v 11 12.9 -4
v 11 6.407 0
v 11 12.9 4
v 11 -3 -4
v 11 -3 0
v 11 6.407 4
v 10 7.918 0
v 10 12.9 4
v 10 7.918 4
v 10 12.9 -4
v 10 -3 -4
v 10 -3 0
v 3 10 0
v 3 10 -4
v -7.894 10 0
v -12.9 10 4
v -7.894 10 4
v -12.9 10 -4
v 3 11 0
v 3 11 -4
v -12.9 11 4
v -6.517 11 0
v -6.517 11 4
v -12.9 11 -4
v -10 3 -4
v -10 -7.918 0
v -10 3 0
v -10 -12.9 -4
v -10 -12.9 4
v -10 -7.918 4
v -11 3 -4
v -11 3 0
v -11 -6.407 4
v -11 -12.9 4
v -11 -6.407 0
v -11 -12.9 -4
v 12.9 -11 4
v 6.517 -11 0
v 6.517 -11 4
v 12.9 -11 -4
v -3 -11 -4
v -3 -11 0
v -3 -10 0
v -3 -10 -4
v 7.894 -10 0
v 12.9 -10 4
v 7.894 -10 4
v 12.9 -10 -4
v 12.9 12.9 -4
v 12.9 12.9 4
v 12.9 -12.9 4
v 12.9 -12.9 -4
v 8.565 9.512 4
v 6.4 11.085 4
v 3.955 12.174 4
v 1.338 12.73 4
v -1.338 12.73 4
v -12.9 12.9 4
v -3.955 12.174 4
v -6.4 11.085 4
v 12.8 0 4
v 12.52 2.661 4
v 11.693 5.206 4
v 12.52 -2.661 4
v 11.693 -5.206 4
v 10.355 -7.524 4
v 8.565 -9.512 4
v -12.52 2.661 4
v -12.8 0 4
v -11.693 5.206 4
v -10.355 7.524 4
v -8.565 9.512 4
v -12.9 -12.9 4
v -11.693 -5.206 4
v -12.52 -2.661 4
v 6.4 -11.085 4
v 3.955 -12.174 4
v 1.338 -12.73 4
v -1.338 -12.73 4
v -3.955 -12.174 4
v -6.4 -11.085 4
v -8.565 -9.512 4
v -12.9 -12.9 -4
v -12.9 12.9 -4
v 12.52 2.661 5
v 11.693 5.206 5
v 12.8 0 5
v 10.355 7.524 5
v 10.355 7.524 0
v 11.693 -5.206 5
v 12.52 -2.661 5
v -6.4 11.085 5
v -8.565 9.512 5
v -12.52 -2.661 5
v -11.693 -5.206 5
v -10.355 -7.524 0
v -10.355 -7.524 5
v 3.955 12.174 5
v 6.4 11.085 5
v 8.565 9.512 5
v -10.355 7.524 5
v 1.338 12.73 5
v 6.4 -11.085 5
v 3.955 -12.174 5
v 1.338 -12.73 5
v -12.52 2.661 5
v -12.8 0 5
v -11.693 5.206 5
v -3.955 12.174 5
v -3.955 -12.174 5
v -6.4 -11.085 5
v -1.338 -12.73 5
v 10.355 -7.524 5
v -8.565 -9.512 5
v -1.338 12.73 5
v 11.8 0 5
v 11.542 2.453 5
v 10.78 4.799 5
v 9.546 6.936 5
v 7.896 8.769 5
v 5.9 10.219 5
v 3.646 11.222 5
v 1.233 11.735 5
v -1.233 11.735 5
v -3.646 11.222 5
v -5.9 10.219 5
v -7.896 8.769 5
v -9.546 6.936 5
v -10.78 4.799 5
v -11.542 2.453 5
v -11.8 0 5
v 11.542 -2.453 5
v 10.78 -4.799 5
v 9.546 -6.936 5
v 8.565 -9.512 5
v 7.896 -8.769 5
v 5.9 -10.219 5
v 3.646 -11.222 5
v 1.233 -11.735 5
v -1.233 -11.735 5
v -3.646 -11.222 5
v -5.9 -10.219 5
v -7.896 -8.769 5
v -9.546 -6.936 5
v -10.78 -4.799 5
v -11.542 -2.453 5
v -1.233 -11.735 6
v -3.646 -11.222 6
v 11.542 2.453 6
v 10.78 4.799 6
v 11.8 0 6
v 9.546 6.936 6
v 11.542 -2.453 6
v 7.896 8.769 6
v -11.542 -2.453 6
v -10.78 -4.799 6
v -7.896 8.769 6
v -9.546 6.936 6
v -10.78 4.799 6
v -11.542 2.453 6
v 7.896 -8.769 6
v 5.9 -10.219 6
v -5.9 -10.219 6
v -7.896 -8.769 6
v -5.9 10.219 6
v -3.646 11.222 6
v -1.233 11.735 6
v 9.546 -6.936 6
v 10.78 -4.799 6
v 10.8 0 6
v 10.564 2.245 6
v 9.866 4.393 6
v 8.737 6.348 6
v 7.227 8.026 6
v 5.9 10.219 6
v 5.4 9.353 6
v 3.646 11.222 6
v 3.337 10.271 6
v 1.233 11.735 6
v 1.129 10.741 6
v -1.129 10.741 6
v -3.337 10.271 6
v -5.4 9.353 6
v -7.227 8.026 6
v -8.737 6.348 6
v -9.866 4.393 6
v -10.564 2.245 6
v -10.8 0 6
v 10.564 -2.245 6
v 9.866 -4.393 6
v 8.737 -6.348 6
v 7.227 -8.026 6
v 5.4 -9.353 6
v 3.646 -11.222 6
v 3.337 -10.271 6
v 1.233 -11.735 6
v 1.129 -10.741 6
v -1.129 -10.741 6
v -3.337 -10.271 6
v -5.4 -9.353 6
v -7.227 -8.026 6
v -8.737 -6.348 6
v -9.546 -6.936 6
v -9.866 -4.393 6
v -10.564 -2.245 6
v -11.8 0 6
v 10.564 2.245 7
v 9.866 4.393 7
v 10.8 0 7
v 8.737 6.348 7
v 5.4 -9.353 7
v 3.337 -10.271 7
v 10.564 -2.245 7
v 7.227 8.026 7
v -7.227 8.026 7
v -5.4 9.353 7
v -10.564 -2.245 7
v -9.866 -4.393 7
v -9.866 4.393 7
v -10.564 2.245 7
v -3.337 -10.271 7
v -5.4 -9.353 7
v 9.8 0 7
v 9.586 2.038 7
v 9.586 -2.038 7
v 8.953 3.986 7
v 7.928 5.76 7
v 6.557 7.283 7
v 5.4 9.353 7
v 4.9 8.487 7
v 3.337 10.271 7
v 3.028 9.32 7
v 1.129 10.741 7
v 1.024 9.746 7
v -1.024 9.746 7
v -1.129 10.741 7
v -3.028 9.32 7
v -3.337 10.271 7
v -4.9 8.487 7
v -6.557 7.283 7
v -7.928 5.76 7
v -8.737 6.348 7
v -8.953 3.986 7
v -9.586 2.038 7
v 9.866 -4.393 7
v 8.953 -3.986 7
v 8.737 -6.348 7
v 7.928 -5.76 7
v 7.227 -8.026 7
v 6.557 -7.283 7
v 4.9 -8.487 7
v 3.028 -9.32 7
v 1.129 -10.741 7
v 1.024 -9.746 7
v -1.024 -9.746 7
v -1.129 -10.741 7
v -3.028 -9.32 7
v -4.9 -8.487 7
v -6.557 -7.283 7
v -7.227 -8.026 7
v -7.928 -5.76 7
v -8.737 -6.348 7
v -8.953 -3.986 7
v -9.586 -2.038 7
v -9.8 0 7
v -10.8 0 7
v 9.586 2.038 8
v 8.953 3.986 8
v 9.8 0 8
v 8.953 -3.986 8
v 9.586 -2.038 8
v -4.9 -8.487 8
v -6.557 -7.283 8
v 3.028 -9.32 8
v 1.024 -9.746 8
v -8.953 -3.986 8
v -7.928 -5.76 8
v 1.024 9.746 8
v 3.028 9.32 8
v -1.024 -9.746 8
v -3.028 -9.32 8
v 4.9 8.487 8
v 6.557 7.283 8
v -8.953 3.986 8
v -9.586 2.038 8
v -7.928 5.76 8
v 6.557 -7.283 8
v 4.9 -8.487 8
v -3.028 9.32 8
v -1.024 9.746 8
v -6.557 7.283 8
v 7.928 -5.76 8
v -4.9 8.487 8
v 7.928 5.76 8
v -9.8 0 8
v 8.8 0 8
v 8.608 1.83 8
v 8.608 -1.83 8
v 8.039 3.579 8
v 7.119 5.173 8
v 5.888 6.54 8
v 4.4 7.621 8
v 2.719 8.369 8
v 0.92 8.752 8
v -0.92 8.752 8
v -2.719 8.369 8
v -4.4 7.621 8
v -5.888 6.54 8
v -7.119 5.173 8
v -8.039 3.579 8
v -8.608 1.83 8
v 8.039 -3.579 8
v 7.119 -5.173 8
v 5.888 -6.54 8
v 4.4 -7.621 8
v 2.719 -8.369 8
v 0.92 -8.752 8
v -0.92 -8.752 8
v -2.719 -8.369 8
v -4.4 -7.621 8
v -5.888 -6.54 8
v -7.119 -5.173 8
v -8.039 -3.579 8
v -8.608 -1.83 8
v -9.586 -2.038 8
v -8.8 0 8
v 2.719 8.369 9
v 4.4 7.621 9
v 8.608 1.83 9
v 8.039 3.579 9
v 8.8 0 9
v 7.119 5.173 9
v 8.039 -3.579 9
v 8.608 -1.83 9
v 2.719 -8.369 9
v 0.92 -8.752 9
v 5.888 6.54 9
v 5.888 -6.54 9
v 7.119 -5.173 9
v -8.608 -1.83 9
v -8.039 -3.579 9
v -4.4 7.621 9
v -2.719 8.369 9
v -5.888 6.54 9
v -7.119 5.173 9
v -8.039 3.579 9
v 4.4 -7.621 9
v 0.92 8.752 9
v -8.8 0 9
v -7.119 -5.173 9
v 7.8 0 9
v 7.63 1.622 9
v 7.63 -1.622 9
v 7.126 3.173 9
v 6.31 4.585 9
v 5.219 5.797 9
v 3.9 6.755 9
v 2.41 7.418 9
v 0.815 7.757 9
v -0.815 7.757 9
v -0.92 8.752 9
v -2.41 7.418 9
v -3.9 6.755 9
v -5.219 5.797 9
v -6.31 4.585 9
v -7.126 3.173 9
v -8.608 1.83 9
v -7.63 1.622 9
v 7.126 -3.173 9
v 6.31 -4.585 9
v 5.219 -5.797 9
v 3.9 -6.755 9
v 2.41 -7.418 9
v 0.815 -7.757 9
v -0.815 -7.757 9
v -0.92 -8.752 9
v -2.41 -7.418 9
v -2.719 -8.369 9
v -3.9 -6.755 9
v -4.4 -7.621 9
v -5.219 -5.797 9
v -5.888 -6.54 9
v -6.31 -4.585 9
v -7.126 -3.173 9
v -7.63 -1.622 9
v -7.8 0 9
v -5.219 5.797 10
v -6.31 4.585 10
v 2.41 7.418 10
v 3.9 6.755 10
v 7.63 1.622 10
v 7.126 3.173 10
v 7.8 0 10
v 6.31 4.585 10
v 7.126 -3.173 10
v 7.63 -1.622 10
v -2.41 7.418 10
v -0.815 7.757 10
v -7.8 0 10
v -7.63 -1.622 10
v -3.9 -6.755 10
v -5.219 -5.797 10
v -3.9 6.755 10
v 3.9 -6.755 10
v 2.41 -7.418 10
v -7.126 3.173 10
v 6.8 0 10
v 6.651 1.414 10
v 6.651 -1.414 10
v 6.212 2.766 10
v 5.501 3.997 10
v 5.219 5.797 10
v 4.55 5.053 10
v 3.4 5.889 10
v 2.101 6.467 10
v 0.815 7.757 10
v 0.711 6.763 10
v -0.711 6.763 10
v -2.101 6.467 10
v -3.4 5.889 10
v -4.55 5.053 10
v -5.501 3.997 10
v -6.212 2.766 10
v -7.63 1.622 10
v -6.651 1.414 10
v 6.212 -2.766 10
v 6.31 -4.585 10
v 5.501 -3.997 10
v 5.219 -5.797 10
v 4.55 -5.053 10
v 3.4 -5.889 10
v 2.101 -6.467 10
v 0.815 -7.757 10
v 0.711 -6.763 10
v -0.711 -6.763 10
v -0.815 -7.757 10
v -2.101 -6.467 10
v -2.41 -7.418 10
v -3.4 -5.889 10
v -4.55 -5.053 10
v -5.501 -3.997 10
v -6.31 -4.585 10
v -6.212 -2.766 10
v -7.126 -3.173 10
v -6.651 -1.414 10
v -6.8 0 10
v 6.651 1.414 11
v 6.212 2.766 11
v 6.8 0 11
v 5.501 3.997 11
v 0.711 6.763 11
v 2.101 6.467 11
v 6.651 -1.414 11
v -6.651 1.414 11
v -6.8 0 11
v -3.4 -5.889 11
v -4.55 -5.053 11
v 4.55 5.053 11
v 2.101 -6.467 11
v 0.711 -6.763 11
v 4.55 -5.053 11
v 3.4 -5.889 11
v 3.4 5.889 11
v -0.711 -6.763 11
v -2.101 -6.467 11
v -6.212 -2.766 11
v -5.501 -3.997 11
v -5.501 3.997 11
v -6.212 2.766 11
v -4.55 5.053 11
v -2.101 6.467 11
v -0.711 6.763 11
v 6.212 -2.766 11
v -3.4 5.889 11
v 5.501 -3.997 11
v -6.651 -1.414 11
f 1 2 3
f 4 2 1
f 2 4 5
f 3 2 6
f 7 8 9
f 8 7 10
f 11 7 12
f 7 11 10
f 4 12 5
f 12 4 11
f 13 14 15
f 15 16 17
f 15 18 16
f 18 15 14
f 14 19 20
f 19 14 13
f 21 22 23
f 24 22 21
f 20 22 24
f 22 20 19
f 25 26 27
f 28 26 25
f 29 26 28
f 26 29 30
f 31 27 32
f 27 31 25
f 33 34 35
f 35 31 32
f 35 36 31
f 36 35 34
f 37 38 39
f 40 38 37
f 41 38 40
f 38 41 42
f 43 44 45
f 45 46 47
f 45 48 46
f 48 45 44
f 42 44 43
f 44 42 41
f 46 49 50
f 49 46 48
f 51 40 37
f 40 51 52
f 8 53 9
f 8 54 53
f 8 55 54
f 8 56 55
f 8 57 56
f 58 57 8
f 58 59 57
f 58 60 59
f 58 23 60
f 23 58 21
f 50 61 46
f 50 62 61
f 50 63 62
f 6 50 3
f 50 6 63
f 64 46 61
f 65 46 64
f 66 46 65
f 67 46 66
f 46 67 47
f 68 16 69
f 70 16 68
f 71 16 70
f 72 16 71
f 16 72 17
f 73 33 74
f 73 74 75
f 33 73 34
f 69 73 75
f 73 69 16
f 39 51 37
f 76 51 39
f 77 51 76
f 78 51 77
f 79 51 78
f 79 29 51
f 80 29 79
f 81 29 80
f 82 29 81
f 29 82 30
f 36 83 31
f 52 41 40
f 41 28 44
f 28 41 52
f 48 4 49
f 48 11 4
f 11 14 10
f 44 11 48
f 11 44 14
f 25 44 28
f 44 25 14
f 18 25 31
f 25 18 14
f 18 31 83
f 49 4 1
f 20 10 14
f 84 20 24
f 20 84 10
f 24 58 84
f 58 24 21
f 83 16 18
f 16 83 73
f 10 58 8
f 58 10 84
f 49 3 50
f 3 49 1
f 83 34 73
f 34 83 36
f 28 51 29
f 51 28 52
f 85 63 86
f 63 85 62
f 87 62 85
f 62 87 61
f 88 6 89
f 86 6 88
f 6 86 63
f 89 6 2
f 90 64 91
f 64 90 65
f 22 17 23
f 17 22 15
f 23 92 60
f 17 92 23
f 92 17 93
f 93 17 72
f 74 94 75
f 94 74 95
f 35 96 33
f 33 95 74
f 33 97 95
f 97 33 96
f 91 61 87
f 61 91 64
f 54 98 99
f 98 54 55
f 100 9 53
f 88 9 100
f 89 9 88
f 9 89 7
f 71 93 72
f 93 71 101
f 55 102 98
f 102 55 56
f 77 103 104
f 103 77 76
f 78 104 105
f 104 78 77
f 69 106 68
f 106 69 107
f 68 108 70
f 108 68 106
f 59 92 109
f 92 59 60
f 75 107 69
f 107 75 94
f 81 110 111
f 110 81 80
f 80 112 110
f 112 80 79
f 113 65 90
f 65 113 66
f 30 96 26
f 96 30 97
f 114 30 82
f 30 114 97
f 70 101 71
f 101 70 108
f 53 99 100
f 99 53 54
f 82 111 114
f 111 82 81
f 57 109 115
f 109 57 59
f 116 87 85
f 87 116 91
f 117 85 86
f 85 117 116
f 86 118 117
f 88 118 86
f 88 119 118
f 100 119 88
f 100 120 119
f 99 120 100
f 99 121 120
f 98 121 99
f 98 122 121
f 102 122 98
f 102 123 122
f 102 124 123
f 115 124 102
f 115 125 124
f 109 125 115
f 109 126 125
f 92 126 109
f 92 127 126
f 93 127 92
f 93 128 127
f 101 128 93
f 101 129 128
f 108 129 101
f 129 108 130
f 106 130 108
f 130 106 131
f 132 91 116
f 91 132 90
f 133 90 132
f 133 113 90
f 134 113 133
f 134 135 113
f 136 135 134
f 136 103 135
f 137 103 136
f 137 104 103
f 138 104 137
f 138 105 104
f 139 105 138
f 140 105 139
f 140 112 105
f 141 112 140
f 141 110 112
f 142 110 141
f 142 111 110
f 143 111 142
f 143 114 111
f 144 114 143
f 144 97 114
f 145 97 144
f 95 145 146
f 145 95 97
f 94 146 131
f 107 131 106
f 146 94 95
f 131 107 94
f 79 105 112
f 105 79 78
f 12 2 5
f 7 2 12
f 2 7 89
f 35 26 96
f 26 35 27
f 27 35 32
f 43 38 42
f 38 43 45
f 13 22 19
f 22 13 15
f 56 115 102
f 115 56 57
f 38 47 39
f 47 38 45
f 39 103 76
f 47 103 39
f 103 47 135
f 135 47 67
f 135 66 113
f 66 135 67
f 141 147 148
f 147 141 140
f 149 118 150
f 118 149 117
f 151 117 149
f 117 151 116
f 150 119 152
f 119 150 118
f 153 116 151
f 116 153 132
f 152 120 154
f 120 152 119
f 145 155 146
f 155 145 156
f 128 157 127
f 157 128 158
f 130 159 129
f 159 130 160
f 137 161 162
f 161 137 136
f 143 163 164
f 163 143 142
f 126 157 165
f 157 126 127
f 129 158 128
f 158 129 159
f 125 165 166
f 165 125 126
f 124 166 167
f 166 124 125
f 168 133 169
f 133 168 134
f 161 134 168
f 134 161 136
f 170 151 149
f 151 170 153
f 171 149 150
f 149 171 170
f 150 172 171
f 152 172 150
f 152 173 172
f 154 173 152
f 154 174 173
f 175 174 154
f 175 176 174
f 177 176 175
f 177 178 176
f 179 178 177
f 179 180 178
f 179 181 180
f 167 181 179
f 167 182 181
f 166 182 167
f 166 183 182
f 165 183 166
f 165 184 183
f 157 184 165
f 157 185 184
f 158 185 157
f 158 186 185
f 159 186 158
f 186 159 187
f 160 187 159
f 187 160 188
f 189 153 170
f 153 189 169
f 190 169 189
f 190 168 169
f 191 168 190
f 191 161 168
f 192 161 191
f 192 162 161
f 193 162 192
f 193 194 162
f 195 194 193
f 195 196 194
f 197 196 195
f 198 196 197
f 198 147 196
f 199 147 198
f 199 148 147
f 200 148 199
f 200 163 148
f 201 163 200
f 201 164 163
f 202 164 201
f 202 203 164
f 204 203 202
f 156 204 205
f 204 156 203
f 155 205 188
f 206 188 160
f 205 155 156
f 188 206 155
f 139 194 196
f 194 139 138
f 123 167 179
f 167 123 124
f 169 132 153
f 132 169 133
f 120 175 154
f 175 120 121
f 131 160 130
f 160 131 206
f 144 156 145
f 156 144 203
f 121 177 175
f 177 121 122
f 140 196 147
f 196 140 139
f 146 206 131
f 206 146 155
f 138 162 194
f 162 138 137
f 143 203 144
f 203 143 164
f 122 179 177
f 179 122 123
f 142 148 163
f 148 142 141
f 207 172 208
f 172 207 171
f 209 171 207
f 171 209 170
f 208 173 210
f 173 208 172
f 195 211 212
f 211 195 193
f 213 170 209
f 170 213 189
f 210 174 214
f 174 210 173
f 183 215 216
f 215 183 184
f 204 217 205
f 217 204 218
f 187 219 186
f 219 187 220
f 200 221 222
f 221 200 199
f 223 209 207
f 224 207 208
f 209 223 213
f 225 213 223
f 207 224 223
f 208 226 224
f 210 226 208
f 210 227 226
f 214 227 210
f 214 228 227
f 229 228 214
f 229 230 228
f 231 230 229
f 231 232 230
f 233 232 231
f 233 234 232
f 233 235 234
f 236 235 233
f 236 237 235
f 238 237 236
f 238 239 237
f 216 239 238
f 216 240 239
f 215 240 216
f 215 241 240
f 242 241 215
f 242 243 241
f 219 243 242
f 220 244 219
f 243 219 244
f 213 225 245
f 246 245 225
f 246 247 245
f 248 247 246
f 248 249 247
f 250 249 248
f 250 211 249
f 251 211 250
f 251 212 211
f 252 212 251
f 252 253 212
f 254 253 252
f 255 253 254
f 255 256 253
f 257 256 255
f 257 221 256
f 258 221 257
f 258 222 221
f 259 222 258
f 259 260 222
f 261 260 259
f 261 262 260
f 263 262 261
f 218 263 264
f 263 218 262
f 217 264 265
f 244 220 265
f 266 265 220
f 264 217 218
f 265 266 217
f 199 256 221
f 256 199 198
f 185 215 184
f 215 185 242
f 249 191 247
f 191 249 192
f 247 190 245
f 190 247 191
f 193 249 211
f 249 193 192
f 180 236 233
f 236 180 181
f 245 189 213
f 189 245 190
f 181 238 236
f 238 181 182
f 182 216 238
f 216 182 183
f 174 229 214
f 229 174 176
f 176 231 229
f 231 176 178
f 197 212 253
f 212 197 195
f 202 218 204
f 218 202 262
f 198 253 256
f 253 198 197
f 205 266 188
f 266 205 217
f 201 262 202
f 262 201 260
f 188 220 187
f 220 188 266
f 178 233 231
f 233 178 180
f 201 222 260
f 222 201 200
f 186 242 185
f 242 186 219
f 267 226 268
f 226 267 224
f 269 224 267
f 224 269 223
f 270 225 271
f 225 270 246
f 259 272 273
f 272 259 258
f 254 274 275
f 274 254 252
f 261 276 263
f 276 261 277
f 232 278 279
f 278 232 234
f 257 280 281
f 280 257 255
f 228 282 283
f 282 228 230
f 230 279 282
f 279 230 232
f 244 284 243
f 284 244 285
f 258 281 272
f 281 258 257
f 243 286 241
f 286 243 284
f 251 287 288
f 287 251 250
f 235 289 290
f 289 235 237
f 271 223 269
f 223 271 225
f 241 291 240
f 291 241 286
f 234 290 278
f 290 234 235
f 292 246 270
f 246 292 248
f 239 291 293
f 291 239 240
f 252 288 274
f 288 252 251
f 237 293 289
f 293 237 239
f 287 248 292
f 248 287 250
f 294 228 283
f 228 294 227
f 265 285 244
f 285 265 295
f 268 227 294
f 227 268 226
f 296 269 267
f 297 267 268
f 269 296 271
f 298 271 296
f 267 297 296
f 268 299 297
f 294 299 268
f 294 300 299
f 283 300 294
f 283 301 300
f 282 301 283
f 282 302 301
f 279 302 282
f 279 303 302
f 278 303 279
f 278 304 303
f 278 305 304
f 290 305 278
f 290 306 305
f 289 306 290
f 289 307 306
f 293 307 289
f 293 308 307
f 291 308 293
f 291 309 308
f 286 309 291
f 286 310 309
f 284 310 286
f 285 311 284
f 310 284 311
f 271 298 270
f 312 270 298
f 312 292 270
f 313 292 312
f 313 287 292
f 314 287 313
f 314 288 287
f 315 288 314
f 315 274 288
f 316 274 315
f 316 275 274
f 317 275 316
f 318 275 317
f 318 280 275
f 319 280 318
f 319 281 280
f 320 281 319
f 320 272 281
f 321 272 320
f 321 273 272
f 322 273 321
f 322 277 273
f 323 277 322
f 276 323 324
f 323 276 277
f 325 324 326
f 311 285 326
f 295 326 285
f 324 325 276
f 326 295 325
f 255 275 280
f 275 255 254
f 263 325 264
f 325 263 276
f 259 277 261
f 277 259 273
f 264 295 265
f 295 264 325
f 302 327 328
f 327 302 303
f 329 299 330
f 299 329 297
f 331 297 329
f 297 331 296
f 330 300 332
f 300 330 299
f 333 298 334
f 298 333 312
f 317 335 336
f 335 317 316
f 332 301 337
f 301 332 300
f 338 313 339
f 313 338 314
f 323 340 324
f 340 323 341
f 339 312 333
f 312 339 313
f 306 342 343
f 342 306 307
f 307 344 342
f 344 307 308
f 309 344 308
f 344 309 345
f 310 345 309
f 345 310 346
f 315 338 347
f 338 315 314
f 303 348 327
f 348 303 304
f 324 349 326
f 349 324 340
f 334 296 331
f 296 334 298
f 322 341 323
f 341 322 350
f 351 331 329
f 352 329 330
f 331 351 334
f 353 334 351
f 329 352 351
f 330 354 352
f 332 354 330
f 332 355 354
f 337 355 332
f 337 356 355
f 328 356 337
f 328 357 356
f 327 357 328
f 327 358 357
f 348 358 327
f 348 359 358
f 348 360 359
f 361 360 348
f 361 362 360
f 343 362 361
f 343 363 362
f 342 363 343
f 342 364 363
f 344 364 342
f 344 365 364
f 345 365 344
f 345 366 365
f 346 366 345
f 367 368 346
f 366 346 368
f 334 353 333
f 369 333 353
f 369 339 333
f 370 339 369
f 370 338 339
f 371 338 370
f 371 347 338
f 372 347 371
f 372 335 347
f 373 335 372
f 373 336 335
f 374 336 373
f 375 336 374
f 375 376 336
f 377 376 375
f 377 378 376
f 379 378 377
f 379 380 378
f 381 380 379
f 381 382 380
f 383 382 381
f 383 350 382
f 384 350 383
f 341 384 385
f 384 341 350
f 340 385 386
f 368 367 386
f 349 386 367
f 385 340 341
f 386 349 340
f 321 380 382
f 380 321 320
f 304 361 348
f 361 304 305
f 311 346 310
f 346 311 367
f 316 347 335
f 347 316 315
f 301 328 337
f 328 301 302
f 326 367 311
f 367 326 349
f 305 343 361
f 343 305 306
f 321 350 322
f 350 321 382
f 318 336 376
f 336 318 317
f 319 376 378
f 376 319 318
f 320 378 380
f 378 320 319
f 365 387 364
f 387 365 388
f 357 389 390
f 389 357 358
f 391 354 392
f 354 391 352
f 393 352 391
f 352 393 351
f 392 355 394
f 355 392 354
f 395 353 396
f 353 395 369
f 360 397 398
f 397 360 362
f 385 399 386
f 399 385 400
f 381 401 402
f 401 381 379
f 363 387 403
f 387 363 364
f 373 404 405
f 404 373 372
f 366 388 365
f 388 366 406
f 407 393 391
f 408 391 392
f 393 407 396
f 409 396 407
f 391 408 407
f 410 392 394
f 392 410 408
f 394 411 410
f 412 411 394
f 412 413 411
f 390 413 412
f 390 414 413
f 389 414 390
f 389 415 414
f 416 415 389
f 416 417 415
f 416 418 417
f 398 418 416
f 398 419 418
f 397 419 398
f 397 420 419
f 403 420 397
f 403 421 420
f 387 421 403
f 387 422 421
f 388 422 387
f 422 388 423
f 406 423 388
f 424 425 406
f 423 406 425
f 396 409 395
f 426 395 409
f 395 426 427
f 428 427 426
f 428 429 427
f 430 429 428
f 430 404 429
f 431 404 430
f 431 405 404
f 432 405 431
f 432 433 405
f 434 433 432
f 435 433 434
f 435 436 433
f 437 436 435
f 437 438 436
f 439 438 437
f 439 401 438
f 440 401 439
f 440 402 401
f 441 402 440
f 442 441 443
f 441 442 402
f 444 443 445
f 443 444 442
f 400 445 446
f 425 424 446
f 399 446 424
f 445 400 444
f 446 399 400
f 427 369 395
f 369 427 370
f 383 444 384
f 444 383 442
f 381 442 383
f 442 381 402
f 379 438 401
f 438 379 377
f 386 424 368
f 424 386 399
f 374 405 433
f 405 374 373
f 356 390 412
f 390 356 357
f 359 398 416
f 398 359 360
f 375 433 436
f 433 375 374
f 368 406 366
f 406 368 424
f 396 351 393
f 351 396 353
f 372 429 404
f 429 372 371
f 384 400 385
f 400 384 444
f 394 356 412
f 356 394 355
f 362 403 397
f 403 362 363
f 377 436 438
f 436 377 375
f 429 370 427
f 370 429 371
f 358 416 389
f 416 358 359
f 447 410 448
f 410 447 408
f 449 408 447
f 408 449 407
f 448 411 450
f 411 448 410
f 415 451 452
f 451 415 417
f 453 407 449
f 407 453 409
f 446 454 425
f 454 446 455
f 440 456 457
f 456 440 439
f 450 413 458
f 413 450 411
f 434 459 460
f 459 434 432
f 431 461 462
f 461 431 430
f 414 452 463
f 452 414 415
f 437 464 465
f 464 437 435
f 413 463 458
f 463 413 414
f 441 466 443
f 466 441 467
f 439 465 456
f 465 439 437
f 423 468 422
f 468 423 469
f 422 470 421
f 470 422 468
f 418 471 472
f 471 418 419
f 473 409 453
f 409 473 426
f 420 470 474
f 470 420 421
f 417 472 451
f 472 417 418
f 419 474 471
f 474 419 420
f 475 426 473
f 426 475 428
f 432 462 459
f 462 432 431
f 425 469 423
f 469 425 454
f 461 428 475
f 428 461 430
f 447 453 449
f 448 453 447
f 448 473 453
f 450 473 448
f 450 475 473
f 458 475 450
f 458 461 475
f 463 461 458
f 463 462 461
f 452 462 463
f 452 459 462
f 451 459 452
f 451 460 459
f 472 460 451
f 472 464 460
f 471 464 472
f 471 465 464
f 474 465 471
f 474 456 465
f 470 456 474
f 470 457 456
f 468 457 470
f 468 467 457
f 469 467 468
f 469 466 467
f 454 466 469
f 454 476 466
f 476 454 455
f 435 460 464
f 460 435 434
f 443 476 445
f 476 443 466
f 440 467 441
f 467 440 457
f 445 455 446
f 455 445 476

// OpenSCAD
$fn=30;
tol=0.2;
difference(){
  union(){
    cube([26-tol,26-tol,8],center=true);
    //cylinder(r1=13,r2=10,h=10);
  }
  translate([0,0,-5])
  for ( i = [0 : 4] )
  {
    rotate( i * 360 / 4,[0,0,1])
    translate([10,-3,0])
    cube([1,30,10]);
  }
}

for ( i = [0 : 6] )
{
       cylinder(r = 12.8-i,h=5+i);
} 

/*
translate([0,0,40]) cylinder(r1=10,r2=15,h=5);
for ( i = [0 : 6] )
{
    rotate( i * 360 / 6,[0,0,1])
    translate([0, 10, 0])
    difference(){
      union(){
        cylinder(r = 2.8,h=50);
      }
      cylinder(r = 3-2,h=50+1);
  }
}
*/
